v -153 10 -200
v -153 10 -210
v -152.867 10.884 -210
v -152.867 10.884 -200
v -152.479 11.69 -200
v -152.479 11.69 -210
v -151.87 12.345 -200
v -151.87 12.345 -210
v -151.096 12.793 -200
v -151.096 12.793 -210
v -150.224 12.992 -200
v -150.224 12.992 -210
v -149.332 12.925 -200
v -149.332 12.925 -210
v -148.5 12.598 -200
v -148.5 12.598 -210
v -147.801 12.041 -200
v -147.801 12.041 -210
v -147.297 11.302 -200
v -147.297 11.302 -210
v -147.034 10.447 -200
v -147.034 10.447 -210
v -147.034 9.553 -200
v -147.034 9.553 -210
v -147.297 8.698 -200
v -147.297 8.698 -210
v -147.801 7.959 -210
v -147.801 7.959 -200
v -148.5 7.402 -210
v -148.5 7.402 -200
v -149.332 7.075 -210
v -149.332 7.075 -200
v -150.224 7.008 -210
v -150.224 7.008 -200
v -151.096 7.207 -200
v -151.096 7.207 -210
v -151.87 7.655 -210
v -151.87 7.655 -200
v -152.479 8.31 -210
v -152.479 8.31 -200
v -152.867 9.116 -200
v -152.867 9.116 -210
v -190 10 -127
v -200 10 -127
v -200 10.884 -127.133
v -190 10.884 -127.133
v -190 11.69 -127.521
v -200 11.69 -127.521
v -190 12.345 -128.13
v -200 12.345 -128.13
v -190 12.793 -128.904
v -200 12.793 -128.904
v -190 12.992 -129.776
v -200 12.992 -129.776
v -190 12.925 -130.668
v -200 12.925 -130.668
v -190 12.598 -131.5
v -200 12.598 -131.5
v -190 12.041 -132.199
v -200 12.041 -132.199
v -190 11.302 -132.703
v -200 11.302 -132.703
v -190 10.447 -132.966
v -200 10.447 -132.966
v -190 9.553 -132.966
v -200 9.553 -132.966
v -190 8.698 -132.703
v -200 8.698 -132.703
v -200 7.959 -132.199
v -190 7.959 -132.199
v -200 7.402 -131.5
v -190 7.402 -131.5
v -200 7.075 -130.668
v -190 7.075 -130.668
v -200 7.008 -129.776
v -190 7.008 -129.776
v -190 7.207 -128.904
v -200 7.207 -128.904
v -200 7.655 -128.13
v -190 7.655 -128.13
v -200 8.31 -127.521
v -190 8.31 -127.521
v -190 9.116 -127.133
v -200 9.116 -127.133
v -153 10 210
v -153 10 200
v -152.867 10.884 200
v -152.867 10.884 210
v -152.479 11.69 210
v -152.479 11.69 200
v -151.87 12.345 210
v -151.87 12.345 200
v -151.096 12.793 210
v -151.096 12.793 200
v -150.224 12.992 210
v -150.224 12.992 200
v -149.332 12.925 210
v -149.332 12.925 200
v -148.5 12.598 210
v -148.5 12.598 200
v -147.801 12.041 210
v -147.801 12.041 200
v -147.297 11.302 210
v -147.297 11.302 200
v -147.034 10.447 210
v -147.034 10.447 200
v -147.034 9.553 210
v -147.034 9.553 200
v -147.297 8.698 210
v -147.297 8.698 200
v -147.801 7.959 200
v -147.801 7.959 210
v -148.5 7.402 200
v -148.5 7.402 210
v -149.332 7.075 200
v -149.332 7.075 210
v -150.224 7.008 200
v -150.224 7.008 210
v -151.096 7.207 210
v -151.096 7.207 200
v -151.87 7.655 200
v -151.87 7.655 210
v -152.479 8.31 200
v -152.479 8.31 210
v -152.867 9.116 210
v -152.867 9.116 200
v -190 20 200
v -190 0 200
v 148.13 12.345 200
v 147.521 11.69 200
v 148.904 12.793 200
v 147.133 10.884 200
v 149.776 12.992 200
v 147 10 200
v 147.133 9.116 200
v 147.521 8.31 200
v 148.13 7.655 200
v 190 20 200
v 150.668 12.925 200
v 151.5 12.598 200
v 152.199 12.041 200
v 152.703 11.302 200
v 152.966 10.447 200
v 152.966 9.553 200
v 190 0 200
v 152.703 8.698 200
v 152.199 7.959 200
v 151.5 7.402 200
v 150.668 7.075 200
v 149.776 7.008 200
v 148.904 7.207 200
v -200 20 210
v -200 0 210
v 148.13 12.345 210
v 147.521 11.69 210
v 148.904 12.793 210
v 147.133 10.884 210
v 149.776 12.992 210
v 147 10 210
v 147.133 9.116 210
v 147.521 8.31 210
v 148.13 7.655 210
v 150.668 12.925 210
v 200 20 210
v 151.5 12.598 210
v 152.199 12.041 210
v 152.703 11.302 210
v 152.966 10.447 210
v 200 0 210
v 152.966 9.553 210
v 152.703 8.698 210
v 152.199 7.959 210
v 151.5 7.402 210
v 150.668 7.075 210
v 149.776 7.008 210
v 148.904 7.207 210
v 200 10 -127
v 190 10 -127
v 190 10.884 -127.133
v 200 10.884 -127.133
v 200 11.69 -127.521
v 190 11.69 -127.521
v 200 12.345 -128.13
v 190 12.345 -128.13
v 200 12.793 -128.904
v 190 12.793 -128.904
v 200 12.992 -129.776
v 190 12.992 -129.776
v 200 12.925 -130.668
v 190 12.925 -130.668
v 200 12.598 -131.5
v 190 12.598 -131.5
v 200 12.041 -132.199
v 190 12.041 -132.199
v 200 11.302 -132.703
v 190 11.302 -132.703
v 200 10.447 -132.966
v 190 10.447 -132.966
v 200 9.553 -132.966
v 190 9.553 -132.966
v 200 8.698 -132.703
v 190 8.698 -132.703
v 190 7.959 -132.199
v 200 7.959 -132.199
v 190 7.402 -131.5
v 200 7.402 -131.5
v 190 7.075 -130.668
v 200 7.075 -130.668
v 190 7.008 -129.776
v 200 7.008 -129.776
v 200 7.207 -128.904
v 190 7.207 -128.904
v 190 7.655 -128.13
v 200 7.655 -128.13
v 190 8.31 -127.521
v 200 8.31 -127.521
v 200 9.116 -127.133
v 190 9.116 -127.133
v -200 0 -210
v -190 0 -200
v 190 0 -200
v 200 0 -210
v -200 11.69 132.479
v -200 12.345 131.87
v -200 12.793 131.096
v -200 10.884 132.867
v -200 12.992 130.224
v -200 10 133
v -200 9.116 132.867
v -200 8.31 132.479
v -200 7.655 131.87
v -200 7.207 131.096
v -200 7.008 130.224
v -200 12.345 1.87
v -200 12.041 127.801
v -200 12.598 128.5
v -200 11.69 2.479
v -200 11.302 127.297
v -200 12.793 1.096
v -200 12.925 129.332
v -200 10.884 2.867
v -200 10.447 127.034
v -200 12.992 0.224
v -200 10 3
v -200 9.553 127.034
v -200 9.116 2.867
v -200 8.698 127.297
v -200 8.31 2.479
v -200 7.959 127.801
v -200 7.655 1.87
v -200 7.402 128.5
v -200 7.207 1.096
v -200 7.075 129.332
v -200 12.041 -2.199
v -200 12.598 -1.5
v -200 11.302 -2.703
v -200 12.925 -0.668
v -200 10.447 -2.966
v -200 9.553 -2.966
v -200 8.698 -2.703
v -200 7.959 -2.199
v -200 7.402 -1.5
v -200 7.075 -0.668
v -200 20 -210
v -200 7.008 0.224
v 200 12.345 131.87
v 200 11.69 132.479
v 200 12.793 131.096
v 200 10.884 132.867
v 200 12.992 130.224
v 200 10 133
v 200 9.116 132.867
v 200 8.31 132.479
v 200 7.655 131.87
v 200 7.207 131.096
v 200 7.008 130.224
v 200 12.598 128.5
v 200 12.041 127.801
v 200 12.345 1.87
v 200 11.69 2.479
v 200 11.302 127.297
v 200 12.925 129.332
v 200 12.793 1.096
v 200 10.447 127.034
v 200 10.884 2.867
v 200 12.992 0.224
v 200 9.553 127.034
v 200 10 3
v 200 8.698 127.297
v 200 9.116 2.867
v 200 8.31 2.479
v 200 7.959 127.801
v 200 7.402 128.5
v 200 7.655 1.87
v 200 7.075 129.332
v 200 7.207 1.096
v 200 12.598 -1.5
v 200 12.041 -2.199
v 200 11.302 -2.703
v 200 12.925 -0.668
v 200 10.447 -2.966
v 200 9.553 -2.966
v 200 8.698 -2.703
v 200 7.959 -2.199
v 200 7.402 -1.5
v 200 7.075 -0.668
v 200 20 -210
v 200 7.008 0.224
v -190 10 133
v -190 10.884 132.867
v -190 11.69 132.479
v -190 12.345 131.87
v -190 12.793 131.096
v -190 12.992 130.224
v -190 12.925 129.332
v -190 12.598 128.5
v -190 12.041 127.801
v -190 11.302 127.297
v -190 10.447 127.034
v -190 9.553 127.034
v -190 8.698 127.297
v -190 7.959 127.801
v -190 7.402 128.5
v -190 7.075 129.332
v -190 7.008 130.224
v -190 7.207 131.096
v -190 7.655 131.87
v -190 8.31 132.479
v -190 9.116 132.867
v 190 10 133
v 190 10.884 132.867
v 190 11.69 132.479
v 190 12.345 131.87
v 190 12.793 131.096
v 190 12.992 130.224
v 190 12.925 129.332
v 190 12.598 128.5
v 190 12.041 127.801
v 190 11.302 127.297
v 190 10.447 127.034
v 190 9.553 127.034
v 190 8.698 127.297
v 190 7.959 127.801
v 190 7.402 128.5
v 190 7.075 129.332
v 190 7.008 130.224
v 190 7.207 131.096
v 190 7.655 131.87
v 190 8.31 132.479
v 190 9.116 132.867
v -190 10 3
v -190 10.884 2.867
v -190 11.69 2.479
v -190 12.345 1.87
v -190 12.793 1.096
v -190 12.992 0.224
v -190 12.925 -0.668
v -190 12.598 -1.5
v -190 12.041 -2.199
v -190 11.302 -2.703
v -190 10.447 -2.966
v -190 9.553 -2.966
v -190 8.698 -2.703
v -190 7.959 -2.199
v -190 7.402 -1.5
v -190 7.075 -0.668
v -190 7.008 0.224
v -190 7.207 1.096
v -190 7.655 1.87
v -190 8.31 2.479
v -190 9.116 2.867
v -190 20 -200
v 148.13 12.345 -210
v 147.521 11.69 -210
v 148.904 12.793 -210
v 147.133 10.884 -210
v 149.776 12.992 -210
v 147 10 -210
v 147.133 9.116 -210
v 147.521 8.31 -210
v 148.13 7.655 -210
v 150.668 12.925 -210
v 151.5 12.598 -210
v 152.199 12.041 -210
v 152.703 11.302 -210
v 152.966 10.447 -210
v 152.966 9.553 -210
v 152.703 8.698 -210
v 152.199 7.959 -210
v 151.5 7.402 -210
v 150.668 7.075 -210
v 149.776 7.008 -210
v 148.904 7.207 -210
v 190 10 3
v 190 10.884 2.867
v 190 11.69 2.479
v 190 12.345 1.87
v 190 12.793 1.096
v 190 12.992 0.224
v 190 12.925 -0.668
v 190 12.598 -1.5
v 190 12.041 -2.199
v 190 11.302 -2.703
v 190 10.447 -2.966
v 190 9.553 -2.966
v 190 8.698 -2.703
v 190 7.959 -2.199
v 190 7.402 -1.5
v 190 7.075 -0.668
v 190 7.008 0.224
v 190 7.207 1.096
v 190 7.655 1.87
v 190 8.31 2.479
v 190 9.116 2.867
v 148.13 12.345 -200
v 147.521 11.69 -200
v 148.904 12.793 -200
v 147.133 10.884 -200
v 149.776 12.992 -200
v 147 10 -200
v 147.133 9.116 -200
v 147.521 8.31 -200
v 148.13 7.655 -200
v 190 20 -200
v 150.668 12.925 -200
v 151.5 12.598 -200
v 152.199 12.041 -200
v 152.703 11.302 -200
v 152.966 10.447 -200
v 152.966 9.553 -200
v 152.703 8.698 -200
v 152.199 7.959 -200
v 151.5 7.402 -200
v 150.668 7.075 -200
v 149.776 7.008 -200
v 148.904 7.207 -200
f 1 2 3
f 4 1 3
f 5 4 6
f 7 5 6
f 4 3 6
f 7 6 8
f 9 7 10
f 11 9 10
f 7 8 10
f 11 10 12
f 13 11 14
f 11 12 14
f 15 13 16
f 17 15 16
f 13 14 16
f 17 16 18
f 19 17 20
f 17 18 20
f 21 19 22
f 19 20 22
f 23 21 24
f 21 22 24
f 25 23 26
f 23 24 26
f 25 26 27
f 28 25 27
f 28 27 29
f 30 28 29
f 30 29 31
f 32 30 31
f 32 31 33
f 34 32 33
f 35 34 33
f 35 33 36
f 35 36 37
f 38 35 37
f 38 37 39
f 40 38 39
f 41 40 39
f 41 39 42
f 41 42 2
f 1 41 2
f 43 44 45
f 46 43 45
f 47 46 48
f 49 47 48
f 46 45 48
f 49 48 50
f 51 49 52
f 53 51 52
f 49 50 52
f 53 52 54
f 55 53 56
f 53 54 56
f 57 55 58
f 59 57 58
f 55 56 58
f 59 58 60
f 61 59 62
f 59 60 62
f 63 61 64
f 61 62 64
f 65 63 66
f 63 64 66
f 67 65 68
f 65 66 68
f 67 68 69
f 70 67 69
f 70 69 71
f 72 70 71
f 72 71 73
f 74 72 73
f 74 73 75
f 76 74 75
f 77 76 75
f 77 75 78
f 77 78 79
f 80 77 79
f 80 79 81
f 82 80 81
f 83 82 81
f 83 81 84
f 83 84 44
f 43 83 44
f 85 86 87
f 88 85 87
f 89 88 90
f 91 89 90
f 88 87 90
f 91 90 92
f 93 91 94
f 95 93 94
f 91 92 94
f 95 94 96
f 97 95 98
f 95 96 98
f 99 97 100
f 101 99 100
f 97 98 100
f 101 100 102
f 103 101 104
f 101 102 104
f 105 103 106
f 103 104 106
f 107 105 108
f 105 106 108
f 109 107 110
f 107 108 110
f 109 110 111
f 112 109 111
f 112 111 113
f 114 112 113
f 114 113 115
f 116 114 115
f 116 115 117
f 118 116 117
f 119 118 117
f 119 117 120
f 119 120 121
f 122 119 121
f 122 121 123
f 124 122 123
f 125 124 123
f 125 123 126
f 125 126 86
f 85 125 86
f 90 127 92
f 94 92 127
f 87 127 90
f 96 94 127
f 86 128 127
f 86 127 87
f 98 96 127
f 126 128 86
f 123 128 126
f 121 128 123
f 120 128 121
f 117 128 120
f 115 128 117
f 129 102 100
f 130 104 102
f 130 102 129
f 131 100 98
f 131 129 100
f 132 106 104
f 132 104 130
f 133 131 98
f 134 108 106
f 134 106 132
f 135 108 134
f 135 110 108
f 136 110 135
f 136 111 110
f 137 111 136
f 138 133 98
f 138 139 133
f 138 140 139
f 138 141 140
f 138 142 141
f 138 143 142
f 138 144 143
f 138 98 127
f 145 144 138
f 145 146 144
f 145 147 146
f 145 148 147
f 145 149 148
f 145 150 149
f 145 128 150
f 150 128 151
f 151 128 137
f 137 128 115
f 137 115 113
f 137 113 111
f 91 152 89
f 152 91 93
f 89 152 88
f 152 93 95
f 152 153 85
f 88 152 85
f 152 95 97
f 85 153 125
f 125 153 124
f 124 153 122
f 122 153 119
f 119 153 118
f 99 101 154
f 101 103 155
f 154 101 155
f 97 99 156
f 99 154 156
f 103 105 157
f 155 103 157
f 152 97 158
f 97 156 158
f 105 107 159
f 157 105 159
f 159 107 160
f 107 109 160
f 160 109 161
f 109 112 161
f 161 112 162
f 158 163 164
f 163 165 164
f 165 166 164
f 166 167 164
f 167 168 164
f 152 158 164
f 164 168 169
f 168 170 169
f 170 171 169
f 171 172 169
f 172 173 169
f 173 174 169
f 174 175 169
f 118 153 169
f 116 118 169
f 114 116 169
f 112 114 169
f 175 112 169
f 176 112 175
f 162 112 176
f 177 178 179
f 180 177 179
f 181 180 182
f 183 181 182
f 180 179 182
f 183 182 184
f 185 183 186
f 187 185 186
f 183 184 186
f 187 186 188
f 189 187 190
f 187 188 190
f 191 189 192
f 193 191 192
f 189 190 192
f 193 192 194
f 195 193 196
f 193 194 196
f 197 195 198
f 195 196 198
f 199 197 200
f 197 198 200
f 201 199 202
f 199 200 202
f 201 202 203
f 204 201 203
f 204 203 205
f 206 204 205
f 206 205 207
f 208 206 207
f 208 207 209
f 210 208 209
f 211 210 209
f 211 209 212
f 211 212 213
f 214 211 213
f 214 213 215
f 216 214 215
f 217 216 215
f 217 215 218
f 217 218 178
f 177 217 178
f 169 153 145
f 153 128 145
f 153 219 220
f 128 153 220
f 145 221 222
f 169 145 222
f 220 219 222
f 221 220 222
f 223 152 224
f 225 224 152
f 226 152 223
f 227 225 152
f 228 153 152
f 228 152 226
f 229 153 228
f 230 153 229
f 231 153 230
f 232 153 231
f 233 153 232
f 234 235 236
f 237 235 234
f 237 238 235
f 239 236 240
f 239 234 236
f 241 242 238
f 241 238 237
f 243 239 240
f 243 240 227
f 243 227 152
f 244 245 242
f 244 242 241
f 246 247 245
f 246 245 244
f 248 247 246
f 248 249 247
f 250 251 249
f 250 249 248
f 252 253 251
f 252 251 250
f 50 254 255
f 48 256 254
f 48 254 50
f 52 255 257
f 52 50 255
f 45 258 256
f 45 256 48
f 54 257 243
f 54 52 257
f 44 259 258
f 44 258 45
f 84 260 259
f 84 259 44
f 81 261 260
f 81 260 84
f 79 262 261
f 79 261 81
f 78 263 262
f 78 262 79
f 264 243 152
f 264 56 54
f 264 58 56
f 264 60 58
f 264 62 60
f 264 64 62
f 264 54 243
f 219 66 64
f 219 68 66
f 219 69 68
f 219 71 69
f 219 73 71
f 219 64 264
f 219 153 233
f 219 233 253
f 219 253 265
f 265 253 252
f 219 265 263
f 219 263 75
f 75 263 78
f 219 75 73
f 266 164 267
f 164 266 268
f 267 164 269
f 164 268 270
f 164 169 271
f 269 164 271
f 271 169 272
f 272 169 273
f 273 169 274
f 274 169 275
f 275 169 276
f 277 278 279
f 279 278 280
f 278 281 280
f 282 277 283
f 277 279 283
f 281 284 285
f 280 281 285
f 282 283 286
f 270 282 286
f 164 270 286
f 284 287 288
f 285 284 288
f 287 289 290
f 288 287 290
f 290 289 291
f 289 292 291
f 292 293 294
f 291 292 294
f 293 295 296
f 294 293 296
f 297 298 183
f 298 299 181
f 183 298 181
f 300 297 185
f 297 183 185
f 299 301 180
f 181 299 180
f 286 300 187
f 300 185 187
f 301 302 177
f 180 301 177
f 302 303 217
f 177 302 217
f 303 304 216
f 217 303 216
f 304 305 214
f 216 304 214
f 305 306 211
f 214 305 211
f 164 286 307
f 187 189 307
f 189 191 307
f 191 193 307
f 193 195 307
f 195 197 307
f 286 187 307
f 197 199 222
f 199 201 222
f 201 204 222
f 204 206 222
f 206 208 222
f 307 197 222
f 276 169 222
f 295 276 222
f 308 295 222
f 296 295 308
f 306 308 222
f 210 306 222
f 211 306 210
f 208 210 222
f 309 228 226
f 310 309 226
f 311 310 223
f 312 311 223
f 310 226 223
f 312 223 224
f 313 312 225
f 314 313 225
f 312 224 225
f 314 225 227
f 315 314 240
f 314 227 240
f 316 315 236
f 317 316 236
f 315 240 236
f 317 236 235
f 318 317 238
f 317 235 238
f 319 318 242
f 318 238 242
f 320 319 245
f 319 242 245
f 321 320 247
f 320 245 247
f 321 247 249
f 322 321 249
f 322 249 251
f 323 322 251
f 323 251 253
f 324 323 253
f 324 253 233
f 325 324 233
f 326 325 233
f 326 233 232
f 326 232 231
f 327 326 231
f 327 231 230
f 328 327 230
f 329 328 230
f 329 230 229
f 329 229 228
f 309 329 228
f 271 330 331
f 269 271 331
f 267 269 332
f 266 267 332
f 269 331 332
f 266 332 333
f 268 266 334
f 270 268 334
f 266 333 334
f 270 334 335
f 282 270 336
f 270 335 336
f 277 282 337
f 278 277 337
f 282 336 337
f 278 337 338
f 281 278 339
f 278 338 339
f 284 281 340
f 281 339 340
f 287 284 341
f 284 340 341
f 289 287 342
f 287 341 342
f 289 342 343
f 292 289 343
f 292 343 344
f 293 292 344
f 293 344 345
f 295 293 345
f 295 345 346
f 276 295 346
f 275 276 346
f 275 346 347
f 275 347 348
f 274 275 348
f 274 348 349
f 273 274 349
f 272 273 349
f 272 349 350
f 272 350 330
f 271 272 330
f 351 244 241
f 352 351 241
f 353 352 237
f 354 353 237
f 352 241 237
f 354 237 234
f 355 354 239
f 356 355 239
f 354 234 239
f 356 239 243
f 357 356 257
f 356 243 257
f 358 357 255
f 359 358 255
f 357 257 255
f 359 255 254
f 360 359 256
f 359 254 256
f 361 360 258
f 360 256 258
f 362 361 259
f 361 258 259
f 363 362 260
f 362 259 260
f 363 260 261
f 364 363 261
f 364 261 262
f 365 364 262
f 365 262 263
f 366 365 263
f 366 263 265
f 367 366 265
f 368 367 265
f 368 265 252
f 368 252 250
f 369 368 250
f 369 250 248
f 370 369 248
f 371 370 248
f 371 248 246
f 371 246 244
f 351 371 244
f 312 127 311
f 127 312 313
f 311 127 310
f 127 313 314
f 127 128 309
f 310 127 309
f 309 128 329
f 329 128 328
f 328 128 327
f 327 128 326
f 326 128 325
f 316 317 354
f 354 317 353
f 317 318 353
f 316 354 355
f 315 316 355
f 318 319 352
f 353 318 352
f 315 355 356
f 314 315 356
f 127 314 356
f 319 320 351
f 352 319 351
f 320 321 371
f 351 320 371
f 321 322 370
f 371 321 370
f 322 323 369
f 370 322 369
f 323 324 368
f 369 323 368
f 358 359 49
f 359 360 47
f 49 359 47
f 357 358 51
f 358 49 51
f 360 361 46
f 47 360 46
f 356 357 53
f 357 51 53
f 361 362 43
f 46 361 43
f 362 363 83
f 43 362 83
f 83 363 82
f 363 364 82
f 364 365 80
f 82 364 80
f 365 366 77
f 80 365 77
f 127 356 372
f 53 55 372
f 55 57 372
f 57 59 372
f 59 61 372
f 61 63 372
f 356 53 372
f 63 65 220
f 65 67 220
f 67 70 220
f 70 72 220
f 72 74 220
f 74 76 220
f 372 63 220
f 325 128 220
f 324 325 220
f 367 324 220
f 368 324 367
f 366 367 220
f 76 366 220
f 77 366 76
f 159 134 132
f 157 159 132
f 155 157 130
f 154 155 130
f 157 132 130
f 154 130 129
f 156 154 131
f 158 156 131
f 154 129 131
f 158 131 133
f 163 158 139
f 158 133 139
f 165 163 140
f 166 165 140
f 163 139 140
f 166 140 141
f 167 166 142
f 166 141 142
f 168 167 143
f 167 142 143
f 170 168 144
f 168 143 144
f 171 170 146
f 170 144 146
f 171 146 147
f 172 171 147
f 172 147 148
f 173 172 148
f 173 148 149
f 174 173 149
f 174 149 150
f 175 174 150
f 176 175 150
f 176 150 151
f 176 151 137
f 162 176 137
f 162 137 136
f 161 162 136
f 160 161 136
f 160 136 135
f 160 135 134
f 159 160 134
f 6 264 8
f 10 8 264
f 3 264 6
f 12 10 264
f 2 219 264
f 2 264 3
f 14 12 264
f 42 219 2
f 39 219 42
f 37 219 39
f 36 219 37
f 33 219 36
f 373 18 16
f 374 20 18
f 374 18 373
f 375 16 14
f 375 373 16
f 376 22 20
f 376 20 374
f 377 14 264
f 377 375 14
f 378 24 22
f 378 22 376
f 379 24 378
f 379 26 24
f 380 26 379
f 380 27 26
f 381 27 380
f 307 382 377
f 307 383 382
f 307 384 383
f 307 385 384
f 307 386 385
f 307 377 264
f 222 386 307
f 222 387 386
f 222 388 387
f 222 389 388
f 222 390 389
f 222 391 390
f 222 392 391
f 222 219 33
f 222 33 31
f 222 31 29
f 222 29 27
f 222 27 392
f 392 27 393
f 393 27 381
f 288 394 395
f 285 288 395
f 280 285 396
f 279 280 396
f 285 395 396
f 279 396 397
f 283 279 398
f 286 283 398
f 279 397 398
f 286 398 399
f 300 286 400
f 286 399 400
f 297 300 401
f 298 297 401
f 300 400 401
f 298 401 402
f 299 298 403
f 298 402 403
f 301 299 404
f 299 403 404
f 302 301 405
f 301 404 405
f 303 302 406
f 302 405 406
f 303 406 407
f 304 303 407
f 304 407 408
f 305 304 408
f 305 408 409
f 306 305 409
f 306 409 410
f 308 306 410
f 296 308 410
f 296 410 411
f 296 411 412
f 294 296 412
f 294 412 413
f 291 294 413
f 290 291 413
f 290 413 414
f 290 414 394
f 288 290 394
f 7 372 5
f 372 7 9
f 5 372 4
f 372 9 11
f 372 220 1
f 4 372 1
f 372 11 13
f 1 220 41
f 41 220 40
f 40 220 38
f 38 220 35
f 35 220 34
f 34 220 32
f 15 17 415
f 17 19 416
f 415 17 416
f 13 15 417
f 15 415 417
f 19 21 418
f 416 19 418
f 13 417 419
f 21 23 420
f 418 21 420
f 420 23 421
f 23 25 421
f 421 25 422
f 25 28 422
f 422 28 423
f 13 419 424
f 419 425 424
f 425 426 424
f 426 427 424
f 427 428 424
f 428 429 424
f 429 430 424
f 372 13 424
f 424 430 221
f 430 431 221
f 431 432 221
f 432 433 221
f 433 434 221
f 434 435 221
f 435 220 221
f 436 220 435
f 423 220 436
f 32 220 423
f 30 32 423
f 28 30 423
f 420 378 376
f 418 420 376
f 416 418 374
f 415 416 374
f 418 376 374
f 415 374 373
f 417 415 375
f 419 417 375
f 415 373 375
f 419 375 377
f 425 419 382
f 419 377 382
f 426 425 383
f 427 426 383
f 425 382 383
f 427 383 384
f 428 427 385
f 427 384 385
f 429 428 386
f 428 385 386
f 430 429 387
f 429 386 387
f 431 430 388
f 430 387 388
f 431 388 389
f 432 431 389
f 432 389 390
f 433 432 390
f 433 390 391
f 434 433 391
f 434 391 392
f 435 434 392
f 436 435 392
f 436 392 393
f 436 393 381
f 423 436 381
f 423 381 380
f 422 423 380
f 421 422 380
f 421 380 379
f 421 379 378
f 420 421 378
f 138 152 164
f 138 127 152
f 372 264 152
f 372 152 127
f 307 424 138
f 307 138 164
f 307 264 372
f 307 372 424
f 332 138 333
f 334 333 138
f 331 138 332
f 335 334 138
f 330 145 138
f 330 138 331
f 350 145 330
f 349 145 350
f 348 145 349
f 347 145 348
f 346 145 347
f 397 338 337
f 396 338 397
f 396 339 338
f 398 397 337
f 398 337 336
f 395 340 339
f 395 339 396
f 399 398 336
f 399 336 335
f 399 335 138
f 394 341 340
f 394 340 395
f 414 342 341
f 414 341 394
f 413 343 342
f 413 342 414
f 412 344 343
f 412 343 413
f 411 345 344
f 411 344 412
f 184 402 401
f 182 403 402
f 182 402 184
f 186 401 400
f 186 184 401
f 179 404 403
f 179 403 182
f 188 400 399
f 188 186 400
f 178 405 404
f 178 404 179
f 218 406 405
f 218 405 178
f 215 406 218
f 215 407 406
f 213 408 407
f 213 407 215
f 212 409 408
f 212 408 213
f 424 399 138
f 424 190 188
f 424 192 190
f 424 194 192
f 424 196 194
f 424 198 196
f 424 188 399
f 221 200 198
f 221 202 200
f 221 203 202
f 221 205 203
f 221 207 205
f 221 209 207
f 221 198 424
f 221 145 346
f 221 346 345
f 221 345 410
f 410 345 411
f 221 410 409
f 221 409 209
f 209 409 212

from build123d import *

# Parameters (mm, degrees)
SKETCH1_W           = 400
SKETCH1_H           = 420
SKETCH1_W_2         = 380
SKETCH1_H_2         = 400
BOSS_EXTRUDE1_DEPTH = 20
SKETCH2_R           = 3
CUT_EXTRUDE1_DEPTH  = 400
SKETCH3_R           = 3
CUT_EXTRUDE2_DEPTH  = 420


with BuildPart() as part:
    # Sketch1 → Boss-Extrude1 (new body)
    with BuildSketch(Plane(origin=(0, 0, 0), x_dir=(1, 0, 0), z_dir=(0, 1, 0))):
        Rectangle(SKETCH1_W, SKETCH1_H)
        Rectangle(SKETCH1_W_2, SKETCH1_H_2, mode=Mode.SUBTRACT)
    extrude(amount=BOSS_EXTRUDE1_DEPTH)

    # Sketch2 → Cut-Extrude1 (cut)
    with BuildSketch(Plane.ZY.offset(200)):
        with Locations((1.026e-06, 10)):
            Circle(SKETCH2_R)
        with Locations((129.999998686, 10)):
            Circle(SKETCH2_R)
        with Locations((-130, 10)):
            Circle(SKETCH2_R)
    extrude(amount=-CUT_EXTRUDE1_DEPTH, mode=Mode.SUBTRACT)

    # Sketch3 → Cut-Extrude2 (cut)
    with BuildSketch(Plane(origin=(0, 0, -210), x_dir=(-1, 0, 0), z_dir=(0, 0, -1))):
        with Locations((-150, 10)):
            Circle(SKETCH3_R)
        with Locations((150, 10)):
            Circle(SKETCH3_R)
    extrude(amount=-CUT_EXTRUDE2_DEPTH, mode=Mode.SUBTRACT)


solid = part.part
